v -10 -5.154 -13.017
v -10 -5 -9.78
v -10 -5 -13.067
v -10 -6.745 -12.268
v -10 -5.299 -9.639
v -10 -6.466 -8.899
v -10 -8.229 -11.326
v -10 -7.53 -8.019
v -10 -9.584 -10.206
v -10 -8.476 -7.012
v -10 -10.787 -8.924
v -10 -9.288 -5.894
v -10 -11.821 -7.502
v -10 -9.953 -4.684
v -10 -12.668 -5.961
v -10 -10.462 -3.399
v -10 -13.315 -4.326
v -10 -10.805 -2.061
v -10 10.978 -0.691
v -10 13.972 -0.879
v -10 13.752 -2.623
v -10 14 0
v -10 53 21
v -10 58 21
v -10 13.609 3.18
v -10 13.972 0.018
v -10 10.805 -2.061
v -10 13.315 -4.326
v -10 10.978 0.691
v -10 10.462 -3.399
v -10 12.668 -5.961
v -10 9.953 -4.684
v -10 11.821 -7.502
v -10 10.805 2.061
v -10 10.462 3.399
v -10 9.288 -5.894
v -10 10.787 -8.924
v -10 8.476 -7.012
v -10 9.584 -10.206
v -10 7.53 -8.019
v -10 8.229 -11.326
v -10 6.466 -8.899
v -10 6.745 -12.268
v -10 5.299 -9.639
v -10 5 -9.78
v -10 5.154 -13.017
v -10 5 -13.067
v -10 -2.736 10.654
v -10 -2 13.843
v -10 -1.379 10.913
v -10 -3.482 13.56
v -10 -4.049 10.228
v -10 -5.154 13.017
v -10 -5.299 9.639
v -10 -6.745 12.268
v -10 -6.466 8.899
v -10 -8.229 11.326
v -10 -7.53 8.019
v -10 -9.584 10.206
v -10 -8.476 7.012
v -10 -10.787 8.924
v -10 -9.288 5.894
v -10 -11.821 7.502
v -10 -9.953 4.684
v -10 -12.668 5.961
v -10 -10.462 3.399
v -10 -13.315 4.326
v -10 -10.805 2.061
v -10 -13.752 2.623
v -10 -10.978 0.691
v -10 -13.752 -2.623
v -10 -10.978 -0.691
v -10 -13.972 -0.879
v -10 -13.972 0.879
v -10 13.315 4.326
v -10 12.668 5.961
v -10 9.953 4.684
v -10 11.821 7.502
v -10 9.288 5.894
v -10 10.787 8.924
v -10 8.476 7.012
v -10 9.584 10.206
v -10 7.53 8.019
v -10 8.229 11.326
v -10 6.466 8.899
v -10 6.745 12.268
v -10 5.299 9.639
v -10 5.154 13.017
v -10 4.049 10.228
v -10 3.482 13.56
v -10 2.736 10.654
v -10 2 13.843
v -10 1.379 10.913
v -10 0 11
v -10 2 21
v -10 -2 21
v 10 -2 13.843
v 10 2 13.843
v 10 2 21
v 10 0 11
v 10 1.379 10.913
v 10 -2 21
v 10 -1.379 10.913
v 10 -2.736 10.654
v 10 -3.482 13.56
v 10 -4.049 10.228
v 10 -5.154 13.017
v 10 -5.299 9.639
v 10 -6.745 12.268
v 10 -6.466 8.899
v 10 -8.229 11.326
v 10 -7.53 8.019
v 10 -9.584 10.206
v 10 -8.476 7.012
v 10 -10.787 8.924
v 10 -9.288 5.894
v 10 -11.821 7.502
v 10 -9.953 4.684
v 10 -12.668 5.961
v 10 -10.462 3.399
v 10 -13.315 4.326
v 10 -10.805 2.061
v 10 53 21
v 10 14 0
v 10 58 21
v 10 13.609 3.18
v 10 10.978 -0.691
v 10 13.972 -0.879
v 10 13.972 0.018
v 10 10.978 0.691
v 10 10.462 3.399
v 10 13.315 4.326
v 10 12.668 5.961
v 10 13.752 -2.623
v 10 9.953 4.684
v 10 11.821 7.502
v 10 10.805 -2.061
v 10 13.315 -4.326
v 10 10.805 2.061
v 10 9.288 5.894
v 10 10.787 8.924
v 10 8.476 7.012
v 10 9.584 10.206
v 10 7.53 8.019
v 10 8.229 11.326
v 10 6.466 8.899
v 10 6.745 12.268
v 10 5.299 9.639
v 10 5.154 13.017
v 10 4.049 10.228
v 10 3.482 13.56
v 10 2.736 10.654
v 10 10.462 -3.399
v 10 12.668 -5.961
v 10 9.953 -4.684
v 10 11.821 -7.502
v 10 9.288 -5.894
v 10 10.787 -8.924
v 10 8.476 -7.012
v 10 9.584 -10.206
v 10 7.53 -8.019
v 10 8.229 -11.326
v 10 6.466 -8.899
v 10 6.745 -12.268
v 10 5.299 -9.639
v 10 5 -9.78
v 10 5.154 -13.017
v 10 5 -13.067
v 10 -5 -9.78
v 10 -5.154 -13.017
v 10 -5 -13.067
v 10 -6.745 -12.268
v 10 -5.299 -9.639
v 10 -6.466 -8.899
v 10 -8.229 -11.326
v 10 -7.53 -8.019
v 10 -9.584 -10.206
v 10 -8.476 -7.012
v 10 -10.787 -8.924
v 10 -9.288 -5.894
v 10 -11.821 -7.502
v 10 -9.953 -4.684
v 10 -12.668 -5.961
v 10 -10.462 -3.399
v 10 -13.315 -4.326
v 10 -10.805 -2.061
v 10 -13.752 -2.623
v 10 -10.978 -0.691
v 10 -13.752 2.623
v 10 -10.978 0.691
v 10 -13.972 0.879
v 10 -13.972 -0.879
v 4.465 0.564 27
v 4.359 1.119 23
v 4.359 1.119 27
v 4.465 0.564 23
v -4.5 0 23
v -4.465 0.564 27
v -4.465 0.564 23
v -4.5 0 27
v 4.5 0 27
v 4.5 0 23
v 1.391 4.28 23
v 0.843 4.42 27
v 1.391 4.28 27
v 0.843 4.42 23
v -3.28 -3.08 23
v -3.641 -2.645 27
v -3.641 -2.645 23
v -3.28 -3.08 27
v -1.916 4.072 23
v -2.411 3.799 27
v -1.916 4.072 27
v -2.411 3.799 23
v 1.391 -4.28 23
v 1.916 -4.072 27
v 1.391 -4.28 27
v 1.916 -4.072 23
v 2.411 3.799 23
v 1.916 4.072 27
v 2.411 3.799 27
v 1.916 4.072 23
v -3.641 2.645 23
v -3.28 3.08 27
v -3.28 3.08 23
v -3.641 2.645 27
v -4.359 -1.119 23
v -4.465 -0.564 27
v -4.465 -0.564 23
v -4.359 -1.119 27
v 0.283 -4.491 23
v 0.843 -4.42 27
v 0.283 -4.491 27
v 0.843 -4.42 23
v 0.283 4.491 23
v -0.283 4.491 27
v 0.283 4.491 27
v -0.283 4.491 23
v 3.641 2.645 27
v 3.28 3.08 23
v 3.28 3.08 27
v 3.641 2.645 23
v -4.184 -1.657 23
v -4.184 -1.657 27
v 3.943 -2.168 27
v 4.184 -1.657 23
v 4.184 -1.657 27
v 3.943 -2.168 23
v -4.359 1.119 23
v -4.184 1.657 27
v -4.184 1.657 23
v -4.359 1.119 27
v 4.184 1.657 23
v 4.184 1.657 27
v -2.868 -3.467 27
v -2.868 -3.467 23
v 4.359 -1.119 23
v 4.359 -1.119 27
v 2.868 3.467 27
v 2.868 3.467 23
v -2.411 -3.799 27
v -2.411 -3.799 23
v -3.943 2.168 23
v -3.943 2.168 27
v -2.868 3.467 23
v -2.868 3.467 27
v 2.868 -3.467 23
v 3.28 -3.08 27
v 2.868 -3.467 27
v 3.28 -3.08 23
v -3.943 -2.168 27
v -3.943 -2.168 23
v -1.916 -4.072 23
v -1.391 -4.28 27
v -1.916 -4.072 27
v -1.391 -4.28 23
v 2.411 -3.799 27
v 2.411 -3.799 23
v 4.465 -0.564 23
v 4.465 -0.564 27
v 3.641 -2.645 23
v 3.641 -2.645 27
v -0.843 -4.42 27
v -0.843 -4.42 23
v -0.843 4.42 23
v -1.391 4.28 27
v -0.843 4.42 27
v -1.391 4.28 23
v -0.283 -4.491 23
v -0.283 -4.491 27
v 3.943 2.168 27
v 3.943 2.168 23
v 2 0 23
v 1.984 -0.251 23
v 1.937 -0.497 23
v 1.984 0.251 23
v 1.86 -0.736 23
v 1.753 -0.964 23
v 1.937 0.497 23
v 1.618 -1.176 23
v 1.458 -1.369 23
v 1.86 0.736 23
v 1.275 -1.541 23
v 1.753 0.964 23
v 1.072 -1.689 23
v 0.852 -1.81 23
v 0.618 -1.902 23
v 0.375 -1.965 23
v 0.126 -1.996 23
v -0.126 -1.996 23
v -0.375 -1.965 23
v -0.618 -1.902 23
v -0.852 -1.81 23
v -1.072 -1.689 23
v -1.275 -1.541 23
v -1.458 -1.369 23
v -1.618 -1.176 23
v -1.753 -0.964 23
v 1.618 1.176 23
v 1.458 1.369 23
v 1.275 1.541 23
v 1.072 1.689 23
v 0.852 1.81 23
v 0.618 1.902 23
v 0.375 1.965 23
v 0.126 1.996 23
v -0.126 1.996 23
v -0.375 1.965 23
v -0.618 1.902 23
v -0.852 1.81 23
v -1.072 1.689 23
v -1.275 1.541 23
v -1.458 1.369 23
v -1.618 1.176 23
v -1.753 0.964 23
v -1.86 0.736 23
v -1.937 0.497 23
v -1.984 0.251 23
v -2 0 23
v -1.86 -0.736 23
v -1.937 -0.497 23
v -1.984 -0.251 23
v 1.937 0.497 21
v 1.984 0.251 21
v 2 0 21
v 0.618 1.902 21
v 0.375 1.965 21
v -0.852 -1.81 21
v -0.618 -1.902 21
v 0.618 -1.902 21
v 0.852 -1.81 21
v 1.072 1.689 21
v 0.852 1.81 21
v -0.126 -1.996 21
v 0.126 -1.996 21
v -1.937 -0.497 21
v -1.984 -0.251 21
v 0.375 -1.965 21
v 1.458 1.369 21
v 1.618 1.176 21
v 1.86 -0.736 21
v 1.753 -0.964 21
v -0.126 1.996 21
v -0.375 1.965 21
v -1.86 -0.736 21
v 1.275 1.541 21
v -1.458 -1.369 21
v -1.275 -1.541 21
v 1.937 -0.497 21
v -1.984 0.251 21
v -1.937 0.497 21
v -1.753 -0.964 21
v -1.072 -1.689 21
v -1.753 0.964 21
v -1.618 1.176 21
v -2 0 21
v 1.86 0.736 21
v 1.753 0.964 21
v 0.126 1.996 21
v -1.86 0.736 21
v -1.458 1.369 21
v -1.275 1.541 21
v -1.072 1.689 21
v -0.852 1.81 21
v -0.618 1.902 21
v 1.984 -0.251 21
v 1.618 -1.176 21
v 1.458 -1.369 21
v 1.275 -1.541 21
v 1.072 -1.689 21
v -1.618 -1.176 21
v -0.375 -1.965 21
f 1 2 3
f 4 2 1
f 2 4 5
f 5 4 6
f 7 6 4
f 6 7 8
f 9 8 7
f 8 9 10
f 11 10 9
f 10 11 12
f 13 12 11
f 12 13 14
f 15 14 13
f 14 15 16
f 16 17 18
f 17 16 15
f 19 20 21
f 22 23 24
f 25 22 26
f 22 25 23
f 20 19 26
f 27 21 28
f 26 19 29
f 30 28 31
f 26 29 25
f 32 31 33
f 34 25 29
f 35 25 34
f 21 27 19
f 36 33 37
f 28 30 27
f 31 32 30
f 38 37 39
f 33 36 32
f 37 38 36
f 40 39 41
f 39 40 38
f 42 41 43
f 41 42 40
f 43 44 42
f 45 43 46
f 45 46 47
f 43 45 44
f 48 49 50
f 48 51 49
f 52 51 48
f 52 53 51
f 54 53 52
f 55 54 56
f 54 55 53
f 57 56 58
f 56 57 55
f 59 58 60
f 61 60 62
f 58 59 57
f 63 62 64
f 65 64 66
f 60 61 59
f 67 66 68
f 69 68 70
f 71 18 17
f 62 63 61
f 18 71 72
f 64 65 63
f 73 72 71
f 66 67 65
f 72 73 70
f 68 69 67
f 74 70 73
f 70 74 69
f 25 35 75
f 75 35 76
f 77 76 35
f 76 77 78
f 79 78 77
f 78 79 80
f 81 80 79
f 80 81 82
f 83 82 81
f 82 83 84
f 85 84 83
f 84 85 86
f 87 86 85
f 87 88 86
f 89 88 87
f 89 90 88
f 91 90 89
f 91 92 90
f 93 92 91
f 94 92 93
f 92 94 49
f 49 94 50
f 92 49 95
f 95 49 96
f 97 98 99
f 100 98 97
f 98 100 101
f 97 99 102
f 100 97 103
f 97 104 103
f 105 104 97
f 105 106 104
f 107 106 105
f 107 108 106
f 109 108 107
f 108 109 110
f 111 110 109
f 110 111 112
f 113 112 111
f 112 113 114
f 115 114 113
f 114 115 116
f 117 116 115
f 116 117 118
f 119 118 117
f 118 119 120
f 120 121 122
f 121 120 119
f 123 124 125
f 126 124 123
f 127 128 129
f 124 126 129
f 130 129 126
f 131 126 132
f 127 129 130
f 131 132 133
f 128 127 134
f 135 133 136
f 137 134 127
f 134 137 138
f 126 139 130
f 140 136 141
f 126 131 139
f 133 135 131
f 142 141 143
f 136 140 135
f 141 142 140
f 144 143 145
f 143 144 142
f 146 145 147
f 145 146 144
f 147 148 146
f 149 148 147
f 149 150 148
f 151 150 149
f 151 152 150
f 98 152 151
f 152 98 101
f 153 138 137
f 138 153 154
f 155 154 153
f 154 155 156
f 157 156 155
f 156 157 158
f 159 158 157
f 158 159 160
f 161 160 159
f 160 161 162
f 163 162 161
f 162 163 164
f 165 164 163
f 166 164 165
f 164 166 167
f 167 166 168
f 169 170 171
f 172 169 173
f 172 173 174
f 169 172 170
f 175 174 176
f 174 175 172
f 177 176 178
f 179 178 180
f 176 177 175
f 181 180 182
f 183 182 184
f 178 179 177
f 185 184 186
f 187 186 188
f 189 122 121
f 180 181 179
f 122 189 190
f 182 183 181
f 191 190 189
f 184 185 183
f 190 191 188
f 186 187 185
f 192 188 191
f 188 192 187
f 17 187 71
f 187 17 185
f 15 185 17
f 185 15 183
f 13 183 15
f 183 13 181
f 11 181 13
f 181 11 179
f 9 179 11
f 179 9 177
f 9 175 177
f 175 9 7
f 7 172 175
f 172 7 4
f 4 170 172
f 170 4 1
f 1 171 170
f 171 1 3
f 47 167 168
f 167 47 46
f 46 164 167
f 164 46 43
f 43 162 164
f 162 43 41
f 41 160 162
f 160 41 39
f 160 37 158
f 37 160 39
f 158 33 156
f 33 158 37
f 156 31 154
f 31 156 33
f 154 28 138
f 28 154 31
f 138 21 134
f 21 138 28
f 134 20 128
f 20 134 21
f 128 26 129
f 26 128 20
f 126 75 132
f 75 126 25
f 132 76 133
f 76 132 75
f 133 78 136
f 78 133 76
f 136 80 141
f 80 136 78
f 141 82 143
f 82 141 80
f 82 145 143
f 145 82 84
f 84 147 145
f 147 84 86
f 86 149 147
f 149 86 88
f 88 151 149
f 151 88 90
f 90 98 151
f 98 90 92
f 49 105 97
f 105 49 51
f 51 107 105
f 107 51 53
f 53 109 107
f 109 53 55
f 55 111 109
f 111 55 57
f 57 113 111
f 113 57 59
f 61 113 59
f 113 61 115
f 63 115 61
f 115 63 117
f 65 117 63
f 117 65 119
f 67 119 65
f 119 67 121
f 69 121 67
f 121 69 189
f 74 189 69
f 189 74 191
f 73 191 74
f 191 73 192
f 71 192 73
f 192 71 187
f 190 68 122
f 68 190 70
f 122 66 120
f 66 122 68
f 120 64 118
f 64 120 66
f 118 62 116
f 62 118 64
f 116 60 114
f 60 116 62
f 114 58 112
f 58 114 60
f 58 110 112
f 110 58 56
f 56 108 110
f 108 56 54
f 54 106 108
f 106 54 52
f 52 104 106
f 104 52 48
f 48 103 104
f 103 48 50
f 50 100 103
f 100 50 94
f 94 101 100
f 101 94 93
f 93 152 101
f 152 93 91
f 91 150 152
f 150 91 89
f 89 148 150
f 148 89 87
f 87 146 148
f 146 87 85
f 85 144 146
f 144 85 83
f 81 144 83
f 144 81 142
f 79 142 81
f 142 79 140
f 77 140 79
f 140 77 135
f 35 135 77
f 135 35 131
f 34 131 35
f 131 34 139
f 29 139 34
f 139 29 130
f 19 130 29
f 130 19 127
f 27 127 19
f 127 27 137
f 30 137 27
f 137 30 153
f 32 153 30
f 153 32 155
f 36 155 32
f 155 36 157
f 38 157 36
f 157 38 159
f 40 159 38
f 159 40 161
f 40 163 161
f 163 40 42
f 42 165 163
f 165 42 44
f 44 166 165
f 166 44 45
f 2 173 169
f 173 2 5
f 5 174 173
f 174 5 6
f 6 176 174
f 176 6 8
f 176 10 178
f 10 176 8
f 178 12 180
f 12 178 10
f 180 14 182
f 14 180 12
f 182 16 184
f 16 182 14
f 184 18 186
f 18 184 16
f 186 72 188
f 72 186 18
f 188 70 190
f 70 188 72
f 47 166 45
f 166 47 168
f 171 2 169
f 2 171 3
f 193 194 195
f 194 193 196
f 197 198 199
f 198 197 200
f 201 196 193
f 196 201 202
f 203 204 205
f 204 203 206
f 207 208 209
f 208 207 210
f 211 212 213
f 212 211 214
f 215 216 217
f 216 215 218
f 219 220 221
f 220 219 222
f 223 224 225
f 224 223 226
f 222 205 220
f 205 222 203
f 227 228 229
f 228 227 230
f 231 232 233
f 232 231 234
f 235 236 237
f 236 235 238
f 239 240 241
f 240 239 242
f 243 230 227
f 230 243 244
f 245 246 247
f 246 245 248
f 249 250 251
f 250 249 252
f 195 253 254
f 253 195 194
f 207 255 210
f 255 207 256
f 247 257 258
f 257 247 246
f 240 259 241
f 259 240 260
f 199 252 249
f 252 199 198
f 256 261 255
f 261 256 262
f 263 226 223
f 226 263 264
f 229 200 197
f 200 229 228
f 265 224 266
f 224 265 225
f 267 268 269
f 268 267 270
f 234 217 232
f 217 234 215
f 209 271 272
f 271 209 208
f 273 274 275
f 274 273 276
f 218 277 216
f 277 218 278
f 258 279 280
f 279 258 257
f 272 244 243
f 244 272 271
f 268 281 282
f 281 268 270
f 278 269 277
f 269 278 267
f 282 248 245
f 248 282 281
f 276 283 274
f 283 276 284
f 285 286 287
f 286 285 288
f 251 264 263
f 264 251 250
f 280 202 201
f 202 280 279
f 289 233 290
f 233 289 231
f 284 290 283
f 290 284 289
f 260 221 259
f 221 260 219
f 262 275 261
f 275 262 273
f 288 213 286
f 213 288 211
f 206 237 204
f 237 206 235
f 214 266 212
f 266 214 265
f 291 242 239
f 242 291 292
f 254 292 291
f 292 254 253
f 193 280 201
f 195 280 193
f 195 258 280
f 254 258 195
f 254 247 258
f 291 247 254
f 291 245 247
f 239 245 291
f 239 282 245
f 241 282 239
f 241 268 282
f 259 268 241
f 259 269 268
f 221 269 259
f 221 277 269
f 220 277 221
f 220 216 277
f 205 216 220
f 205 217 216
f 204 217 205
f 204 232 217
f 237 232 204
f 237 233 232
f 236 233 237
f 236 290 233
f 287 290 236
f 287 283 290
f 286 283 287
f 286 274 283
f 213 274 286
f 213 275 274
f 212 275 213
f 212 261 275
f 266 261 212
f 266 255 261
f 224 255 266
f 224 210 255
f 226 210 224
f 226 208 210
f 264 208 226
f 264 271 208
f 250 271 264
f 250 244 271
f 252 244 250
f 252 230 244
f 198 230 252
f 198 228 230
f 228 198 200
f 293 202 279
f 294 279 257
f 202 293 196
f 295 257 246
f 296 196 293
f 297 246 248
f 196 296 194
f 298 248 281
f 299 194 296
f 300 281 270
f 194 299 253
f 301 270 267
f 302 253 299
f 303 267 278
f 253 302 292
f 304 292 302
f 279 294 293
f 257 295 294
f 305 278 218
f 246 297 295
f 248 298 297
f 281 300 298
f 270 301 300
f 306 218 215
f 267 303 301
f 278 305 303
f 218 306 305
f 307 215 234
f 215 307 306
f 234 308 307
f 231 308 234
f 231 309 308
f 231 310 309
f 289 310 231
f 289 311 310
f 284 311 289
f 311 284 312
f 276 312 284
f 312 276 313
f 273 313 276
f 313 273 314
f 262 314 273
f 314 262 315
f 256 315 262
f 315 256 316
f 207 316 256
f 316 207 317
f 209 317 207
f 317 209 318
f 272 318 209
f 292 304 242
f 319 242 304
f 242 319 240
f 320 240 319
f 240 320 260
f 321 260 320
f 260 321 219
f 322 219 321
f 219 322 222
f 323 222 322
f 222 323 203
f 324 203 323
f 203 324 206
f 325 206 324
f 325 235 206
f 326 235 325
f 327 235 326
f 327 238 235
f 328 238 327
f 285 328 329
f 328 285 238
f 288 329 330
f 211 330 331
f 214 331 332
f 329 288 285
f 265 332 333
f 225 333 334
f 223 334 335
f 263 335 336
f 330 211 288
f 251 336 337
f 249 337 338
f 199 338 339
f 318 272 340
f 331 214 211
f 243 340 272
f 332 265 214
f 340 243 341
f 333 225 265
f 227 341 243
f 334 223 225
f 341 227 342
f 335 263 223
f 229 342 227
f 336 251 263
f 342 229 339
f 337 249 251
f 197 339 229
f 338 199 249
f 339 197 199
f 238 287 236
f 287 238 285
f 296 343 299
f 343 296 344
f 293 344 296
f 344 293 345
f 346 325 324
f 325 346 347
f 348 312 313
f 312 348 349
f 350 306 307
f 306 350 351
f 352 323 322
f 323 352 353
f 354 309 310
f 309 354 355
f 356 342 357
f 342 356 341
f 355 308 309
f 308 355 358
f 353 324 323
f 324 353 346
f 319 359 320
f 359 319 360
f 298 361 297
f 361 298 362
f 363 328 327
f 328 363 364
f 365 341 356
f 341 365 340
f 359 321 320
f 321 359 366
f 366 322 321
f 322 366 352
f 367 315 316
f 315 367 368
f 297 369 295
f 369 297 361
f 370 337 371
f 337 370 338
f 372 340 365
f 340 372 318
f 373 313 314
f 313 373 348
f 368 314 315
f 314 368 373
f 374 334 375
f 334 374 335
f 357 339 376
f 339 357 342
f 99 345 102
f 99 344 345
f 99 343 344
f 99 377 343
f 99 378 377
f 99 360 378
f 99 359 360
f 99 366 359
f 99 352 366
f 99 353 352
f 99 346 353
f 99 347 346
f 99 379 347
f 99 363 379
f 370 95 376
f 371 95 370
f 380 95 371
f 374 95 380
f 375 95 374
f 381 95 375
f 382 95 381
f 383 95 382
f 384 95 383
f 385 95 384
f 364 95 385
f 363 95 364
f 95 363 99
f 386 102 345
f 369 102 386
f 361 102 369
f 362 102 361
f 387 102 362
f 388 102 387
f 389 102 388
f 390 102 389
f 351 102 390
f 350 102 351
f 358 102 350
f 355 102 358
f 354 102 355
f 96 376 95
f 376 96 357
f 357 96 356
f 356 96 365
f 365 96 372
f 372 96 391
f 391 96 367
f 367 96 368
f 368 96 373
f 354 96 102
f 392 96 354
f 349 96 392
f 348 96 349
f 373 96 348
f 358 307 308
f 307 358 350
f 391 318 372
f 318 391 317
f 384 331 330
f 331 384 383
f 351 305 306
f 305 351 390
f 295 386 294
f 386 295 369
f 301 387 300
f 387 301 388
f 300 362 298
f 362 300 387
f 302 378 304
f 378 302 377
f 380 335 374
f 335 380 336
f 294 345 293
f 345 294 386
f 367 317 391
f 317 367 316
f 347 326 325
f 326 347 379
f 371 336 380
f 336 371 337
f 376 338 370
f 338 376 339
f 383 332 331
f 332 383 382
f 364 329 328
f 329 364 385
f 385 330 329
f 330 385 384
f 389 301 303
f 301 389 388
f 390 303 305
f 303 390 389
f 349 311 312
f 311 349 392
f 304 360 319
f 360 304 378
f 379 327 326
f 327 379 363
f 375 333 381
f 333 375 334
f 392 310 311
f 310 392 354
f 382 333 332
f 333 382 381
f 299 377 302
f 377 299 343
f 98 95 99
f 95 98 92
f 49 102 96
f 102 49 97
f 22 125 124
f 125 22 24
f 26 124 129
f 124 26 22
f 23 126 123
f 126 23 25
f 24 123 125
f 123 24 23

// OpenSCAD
$fn = 50;

handlebar_diameter = 22;
handlebar_mount_thickness = 3;

handlebar_offset = 10;
handlebar_offset_length = 55;

clasp_insert_diameter = 4;
clasp_catch_diameter = 9;
clasp_grasp_thickness = 4;
clasp_spacing = 2;

cut_width = 10;
bedplate_length = 9;

mount_width = 20;

module handlebar_cutout() {
    translate([-mount_width / 2, 0, 0]) {
        rotate([0, 90, 0]) {
            linear_extrude(mount_width) {
                // Cutout
                translate([0, -cut_width / 2])
                    square([handlebar_diameter, cut_width]);
            }
        }
    }
}

module handlebar_mount() {
    translate([-mount_width / 2, 0, 0]) {
        rotate([0, 90, 0]) {
            linear_extrude(mount_width) {
                difference() {
                    // Outer circle
                    circle(d = handlebar_diameter + 2 * handlebar_mount_thickness);
                    
                    // Inner circle (cutout)
                    circle(d = handlebar_diameter);
                }
            }
        }
    }
}

module offset() {
    translate([-mount_width / 2, -clasp_insert_diameter / 2, 0]) {
        rotate([0, 90, 0]) {
            linear_extrude(mount_width) {
                // Outer circle
                square([handlebar_offset, clasp_insert_diameter]);
            }
        }
    }
}

module angled_offset() {
    h = handlebar_diameter / 2 + handlebar_offset;
    extra_thickness = 2;

    rotate([90, 0, 90]) {
    linear_extrude(mount_width) {
        polygon([
            [handlebar_diameter / 2 + handlebar_mount_thickness,   0],
            [handlebar_mount_thickness + handlebar_offset_length,  h],
            [handlebar_offset_length - extra_thickness,            h],
            [handlebar_diameter / 2,                               extra_thickness],
        ]);
    }
}
}

module clasp() {
    // Upper portion
    translate([0, 0, clasp_spacing - handlebar_mount_thickness])
        linear_extrude(clasp_grasp_thickness) {
            circle(d = clasp_catch_diameter);
        }
    
    // Lower portion
    translate([0, 0, -handlebar_mount_thickness])
        linear_extrude(clasp_spacing) {
            circle(d = clasp_insert_diameter);
        }
}

module print() {
    difference() {
        handlebar_mount();
        handlebar_cutout();
    }
    translate([0, 0, handlebar_diameter / 2 + handlebar_offset])
        offset();
    translate([-mount_width / 2, 0, 0])
        angled_offset();
    translate([0, 0, handlebar_diameter / 2 + handlebar_mount_thickness + handlebar_offset])
        clasp();
}

print();
